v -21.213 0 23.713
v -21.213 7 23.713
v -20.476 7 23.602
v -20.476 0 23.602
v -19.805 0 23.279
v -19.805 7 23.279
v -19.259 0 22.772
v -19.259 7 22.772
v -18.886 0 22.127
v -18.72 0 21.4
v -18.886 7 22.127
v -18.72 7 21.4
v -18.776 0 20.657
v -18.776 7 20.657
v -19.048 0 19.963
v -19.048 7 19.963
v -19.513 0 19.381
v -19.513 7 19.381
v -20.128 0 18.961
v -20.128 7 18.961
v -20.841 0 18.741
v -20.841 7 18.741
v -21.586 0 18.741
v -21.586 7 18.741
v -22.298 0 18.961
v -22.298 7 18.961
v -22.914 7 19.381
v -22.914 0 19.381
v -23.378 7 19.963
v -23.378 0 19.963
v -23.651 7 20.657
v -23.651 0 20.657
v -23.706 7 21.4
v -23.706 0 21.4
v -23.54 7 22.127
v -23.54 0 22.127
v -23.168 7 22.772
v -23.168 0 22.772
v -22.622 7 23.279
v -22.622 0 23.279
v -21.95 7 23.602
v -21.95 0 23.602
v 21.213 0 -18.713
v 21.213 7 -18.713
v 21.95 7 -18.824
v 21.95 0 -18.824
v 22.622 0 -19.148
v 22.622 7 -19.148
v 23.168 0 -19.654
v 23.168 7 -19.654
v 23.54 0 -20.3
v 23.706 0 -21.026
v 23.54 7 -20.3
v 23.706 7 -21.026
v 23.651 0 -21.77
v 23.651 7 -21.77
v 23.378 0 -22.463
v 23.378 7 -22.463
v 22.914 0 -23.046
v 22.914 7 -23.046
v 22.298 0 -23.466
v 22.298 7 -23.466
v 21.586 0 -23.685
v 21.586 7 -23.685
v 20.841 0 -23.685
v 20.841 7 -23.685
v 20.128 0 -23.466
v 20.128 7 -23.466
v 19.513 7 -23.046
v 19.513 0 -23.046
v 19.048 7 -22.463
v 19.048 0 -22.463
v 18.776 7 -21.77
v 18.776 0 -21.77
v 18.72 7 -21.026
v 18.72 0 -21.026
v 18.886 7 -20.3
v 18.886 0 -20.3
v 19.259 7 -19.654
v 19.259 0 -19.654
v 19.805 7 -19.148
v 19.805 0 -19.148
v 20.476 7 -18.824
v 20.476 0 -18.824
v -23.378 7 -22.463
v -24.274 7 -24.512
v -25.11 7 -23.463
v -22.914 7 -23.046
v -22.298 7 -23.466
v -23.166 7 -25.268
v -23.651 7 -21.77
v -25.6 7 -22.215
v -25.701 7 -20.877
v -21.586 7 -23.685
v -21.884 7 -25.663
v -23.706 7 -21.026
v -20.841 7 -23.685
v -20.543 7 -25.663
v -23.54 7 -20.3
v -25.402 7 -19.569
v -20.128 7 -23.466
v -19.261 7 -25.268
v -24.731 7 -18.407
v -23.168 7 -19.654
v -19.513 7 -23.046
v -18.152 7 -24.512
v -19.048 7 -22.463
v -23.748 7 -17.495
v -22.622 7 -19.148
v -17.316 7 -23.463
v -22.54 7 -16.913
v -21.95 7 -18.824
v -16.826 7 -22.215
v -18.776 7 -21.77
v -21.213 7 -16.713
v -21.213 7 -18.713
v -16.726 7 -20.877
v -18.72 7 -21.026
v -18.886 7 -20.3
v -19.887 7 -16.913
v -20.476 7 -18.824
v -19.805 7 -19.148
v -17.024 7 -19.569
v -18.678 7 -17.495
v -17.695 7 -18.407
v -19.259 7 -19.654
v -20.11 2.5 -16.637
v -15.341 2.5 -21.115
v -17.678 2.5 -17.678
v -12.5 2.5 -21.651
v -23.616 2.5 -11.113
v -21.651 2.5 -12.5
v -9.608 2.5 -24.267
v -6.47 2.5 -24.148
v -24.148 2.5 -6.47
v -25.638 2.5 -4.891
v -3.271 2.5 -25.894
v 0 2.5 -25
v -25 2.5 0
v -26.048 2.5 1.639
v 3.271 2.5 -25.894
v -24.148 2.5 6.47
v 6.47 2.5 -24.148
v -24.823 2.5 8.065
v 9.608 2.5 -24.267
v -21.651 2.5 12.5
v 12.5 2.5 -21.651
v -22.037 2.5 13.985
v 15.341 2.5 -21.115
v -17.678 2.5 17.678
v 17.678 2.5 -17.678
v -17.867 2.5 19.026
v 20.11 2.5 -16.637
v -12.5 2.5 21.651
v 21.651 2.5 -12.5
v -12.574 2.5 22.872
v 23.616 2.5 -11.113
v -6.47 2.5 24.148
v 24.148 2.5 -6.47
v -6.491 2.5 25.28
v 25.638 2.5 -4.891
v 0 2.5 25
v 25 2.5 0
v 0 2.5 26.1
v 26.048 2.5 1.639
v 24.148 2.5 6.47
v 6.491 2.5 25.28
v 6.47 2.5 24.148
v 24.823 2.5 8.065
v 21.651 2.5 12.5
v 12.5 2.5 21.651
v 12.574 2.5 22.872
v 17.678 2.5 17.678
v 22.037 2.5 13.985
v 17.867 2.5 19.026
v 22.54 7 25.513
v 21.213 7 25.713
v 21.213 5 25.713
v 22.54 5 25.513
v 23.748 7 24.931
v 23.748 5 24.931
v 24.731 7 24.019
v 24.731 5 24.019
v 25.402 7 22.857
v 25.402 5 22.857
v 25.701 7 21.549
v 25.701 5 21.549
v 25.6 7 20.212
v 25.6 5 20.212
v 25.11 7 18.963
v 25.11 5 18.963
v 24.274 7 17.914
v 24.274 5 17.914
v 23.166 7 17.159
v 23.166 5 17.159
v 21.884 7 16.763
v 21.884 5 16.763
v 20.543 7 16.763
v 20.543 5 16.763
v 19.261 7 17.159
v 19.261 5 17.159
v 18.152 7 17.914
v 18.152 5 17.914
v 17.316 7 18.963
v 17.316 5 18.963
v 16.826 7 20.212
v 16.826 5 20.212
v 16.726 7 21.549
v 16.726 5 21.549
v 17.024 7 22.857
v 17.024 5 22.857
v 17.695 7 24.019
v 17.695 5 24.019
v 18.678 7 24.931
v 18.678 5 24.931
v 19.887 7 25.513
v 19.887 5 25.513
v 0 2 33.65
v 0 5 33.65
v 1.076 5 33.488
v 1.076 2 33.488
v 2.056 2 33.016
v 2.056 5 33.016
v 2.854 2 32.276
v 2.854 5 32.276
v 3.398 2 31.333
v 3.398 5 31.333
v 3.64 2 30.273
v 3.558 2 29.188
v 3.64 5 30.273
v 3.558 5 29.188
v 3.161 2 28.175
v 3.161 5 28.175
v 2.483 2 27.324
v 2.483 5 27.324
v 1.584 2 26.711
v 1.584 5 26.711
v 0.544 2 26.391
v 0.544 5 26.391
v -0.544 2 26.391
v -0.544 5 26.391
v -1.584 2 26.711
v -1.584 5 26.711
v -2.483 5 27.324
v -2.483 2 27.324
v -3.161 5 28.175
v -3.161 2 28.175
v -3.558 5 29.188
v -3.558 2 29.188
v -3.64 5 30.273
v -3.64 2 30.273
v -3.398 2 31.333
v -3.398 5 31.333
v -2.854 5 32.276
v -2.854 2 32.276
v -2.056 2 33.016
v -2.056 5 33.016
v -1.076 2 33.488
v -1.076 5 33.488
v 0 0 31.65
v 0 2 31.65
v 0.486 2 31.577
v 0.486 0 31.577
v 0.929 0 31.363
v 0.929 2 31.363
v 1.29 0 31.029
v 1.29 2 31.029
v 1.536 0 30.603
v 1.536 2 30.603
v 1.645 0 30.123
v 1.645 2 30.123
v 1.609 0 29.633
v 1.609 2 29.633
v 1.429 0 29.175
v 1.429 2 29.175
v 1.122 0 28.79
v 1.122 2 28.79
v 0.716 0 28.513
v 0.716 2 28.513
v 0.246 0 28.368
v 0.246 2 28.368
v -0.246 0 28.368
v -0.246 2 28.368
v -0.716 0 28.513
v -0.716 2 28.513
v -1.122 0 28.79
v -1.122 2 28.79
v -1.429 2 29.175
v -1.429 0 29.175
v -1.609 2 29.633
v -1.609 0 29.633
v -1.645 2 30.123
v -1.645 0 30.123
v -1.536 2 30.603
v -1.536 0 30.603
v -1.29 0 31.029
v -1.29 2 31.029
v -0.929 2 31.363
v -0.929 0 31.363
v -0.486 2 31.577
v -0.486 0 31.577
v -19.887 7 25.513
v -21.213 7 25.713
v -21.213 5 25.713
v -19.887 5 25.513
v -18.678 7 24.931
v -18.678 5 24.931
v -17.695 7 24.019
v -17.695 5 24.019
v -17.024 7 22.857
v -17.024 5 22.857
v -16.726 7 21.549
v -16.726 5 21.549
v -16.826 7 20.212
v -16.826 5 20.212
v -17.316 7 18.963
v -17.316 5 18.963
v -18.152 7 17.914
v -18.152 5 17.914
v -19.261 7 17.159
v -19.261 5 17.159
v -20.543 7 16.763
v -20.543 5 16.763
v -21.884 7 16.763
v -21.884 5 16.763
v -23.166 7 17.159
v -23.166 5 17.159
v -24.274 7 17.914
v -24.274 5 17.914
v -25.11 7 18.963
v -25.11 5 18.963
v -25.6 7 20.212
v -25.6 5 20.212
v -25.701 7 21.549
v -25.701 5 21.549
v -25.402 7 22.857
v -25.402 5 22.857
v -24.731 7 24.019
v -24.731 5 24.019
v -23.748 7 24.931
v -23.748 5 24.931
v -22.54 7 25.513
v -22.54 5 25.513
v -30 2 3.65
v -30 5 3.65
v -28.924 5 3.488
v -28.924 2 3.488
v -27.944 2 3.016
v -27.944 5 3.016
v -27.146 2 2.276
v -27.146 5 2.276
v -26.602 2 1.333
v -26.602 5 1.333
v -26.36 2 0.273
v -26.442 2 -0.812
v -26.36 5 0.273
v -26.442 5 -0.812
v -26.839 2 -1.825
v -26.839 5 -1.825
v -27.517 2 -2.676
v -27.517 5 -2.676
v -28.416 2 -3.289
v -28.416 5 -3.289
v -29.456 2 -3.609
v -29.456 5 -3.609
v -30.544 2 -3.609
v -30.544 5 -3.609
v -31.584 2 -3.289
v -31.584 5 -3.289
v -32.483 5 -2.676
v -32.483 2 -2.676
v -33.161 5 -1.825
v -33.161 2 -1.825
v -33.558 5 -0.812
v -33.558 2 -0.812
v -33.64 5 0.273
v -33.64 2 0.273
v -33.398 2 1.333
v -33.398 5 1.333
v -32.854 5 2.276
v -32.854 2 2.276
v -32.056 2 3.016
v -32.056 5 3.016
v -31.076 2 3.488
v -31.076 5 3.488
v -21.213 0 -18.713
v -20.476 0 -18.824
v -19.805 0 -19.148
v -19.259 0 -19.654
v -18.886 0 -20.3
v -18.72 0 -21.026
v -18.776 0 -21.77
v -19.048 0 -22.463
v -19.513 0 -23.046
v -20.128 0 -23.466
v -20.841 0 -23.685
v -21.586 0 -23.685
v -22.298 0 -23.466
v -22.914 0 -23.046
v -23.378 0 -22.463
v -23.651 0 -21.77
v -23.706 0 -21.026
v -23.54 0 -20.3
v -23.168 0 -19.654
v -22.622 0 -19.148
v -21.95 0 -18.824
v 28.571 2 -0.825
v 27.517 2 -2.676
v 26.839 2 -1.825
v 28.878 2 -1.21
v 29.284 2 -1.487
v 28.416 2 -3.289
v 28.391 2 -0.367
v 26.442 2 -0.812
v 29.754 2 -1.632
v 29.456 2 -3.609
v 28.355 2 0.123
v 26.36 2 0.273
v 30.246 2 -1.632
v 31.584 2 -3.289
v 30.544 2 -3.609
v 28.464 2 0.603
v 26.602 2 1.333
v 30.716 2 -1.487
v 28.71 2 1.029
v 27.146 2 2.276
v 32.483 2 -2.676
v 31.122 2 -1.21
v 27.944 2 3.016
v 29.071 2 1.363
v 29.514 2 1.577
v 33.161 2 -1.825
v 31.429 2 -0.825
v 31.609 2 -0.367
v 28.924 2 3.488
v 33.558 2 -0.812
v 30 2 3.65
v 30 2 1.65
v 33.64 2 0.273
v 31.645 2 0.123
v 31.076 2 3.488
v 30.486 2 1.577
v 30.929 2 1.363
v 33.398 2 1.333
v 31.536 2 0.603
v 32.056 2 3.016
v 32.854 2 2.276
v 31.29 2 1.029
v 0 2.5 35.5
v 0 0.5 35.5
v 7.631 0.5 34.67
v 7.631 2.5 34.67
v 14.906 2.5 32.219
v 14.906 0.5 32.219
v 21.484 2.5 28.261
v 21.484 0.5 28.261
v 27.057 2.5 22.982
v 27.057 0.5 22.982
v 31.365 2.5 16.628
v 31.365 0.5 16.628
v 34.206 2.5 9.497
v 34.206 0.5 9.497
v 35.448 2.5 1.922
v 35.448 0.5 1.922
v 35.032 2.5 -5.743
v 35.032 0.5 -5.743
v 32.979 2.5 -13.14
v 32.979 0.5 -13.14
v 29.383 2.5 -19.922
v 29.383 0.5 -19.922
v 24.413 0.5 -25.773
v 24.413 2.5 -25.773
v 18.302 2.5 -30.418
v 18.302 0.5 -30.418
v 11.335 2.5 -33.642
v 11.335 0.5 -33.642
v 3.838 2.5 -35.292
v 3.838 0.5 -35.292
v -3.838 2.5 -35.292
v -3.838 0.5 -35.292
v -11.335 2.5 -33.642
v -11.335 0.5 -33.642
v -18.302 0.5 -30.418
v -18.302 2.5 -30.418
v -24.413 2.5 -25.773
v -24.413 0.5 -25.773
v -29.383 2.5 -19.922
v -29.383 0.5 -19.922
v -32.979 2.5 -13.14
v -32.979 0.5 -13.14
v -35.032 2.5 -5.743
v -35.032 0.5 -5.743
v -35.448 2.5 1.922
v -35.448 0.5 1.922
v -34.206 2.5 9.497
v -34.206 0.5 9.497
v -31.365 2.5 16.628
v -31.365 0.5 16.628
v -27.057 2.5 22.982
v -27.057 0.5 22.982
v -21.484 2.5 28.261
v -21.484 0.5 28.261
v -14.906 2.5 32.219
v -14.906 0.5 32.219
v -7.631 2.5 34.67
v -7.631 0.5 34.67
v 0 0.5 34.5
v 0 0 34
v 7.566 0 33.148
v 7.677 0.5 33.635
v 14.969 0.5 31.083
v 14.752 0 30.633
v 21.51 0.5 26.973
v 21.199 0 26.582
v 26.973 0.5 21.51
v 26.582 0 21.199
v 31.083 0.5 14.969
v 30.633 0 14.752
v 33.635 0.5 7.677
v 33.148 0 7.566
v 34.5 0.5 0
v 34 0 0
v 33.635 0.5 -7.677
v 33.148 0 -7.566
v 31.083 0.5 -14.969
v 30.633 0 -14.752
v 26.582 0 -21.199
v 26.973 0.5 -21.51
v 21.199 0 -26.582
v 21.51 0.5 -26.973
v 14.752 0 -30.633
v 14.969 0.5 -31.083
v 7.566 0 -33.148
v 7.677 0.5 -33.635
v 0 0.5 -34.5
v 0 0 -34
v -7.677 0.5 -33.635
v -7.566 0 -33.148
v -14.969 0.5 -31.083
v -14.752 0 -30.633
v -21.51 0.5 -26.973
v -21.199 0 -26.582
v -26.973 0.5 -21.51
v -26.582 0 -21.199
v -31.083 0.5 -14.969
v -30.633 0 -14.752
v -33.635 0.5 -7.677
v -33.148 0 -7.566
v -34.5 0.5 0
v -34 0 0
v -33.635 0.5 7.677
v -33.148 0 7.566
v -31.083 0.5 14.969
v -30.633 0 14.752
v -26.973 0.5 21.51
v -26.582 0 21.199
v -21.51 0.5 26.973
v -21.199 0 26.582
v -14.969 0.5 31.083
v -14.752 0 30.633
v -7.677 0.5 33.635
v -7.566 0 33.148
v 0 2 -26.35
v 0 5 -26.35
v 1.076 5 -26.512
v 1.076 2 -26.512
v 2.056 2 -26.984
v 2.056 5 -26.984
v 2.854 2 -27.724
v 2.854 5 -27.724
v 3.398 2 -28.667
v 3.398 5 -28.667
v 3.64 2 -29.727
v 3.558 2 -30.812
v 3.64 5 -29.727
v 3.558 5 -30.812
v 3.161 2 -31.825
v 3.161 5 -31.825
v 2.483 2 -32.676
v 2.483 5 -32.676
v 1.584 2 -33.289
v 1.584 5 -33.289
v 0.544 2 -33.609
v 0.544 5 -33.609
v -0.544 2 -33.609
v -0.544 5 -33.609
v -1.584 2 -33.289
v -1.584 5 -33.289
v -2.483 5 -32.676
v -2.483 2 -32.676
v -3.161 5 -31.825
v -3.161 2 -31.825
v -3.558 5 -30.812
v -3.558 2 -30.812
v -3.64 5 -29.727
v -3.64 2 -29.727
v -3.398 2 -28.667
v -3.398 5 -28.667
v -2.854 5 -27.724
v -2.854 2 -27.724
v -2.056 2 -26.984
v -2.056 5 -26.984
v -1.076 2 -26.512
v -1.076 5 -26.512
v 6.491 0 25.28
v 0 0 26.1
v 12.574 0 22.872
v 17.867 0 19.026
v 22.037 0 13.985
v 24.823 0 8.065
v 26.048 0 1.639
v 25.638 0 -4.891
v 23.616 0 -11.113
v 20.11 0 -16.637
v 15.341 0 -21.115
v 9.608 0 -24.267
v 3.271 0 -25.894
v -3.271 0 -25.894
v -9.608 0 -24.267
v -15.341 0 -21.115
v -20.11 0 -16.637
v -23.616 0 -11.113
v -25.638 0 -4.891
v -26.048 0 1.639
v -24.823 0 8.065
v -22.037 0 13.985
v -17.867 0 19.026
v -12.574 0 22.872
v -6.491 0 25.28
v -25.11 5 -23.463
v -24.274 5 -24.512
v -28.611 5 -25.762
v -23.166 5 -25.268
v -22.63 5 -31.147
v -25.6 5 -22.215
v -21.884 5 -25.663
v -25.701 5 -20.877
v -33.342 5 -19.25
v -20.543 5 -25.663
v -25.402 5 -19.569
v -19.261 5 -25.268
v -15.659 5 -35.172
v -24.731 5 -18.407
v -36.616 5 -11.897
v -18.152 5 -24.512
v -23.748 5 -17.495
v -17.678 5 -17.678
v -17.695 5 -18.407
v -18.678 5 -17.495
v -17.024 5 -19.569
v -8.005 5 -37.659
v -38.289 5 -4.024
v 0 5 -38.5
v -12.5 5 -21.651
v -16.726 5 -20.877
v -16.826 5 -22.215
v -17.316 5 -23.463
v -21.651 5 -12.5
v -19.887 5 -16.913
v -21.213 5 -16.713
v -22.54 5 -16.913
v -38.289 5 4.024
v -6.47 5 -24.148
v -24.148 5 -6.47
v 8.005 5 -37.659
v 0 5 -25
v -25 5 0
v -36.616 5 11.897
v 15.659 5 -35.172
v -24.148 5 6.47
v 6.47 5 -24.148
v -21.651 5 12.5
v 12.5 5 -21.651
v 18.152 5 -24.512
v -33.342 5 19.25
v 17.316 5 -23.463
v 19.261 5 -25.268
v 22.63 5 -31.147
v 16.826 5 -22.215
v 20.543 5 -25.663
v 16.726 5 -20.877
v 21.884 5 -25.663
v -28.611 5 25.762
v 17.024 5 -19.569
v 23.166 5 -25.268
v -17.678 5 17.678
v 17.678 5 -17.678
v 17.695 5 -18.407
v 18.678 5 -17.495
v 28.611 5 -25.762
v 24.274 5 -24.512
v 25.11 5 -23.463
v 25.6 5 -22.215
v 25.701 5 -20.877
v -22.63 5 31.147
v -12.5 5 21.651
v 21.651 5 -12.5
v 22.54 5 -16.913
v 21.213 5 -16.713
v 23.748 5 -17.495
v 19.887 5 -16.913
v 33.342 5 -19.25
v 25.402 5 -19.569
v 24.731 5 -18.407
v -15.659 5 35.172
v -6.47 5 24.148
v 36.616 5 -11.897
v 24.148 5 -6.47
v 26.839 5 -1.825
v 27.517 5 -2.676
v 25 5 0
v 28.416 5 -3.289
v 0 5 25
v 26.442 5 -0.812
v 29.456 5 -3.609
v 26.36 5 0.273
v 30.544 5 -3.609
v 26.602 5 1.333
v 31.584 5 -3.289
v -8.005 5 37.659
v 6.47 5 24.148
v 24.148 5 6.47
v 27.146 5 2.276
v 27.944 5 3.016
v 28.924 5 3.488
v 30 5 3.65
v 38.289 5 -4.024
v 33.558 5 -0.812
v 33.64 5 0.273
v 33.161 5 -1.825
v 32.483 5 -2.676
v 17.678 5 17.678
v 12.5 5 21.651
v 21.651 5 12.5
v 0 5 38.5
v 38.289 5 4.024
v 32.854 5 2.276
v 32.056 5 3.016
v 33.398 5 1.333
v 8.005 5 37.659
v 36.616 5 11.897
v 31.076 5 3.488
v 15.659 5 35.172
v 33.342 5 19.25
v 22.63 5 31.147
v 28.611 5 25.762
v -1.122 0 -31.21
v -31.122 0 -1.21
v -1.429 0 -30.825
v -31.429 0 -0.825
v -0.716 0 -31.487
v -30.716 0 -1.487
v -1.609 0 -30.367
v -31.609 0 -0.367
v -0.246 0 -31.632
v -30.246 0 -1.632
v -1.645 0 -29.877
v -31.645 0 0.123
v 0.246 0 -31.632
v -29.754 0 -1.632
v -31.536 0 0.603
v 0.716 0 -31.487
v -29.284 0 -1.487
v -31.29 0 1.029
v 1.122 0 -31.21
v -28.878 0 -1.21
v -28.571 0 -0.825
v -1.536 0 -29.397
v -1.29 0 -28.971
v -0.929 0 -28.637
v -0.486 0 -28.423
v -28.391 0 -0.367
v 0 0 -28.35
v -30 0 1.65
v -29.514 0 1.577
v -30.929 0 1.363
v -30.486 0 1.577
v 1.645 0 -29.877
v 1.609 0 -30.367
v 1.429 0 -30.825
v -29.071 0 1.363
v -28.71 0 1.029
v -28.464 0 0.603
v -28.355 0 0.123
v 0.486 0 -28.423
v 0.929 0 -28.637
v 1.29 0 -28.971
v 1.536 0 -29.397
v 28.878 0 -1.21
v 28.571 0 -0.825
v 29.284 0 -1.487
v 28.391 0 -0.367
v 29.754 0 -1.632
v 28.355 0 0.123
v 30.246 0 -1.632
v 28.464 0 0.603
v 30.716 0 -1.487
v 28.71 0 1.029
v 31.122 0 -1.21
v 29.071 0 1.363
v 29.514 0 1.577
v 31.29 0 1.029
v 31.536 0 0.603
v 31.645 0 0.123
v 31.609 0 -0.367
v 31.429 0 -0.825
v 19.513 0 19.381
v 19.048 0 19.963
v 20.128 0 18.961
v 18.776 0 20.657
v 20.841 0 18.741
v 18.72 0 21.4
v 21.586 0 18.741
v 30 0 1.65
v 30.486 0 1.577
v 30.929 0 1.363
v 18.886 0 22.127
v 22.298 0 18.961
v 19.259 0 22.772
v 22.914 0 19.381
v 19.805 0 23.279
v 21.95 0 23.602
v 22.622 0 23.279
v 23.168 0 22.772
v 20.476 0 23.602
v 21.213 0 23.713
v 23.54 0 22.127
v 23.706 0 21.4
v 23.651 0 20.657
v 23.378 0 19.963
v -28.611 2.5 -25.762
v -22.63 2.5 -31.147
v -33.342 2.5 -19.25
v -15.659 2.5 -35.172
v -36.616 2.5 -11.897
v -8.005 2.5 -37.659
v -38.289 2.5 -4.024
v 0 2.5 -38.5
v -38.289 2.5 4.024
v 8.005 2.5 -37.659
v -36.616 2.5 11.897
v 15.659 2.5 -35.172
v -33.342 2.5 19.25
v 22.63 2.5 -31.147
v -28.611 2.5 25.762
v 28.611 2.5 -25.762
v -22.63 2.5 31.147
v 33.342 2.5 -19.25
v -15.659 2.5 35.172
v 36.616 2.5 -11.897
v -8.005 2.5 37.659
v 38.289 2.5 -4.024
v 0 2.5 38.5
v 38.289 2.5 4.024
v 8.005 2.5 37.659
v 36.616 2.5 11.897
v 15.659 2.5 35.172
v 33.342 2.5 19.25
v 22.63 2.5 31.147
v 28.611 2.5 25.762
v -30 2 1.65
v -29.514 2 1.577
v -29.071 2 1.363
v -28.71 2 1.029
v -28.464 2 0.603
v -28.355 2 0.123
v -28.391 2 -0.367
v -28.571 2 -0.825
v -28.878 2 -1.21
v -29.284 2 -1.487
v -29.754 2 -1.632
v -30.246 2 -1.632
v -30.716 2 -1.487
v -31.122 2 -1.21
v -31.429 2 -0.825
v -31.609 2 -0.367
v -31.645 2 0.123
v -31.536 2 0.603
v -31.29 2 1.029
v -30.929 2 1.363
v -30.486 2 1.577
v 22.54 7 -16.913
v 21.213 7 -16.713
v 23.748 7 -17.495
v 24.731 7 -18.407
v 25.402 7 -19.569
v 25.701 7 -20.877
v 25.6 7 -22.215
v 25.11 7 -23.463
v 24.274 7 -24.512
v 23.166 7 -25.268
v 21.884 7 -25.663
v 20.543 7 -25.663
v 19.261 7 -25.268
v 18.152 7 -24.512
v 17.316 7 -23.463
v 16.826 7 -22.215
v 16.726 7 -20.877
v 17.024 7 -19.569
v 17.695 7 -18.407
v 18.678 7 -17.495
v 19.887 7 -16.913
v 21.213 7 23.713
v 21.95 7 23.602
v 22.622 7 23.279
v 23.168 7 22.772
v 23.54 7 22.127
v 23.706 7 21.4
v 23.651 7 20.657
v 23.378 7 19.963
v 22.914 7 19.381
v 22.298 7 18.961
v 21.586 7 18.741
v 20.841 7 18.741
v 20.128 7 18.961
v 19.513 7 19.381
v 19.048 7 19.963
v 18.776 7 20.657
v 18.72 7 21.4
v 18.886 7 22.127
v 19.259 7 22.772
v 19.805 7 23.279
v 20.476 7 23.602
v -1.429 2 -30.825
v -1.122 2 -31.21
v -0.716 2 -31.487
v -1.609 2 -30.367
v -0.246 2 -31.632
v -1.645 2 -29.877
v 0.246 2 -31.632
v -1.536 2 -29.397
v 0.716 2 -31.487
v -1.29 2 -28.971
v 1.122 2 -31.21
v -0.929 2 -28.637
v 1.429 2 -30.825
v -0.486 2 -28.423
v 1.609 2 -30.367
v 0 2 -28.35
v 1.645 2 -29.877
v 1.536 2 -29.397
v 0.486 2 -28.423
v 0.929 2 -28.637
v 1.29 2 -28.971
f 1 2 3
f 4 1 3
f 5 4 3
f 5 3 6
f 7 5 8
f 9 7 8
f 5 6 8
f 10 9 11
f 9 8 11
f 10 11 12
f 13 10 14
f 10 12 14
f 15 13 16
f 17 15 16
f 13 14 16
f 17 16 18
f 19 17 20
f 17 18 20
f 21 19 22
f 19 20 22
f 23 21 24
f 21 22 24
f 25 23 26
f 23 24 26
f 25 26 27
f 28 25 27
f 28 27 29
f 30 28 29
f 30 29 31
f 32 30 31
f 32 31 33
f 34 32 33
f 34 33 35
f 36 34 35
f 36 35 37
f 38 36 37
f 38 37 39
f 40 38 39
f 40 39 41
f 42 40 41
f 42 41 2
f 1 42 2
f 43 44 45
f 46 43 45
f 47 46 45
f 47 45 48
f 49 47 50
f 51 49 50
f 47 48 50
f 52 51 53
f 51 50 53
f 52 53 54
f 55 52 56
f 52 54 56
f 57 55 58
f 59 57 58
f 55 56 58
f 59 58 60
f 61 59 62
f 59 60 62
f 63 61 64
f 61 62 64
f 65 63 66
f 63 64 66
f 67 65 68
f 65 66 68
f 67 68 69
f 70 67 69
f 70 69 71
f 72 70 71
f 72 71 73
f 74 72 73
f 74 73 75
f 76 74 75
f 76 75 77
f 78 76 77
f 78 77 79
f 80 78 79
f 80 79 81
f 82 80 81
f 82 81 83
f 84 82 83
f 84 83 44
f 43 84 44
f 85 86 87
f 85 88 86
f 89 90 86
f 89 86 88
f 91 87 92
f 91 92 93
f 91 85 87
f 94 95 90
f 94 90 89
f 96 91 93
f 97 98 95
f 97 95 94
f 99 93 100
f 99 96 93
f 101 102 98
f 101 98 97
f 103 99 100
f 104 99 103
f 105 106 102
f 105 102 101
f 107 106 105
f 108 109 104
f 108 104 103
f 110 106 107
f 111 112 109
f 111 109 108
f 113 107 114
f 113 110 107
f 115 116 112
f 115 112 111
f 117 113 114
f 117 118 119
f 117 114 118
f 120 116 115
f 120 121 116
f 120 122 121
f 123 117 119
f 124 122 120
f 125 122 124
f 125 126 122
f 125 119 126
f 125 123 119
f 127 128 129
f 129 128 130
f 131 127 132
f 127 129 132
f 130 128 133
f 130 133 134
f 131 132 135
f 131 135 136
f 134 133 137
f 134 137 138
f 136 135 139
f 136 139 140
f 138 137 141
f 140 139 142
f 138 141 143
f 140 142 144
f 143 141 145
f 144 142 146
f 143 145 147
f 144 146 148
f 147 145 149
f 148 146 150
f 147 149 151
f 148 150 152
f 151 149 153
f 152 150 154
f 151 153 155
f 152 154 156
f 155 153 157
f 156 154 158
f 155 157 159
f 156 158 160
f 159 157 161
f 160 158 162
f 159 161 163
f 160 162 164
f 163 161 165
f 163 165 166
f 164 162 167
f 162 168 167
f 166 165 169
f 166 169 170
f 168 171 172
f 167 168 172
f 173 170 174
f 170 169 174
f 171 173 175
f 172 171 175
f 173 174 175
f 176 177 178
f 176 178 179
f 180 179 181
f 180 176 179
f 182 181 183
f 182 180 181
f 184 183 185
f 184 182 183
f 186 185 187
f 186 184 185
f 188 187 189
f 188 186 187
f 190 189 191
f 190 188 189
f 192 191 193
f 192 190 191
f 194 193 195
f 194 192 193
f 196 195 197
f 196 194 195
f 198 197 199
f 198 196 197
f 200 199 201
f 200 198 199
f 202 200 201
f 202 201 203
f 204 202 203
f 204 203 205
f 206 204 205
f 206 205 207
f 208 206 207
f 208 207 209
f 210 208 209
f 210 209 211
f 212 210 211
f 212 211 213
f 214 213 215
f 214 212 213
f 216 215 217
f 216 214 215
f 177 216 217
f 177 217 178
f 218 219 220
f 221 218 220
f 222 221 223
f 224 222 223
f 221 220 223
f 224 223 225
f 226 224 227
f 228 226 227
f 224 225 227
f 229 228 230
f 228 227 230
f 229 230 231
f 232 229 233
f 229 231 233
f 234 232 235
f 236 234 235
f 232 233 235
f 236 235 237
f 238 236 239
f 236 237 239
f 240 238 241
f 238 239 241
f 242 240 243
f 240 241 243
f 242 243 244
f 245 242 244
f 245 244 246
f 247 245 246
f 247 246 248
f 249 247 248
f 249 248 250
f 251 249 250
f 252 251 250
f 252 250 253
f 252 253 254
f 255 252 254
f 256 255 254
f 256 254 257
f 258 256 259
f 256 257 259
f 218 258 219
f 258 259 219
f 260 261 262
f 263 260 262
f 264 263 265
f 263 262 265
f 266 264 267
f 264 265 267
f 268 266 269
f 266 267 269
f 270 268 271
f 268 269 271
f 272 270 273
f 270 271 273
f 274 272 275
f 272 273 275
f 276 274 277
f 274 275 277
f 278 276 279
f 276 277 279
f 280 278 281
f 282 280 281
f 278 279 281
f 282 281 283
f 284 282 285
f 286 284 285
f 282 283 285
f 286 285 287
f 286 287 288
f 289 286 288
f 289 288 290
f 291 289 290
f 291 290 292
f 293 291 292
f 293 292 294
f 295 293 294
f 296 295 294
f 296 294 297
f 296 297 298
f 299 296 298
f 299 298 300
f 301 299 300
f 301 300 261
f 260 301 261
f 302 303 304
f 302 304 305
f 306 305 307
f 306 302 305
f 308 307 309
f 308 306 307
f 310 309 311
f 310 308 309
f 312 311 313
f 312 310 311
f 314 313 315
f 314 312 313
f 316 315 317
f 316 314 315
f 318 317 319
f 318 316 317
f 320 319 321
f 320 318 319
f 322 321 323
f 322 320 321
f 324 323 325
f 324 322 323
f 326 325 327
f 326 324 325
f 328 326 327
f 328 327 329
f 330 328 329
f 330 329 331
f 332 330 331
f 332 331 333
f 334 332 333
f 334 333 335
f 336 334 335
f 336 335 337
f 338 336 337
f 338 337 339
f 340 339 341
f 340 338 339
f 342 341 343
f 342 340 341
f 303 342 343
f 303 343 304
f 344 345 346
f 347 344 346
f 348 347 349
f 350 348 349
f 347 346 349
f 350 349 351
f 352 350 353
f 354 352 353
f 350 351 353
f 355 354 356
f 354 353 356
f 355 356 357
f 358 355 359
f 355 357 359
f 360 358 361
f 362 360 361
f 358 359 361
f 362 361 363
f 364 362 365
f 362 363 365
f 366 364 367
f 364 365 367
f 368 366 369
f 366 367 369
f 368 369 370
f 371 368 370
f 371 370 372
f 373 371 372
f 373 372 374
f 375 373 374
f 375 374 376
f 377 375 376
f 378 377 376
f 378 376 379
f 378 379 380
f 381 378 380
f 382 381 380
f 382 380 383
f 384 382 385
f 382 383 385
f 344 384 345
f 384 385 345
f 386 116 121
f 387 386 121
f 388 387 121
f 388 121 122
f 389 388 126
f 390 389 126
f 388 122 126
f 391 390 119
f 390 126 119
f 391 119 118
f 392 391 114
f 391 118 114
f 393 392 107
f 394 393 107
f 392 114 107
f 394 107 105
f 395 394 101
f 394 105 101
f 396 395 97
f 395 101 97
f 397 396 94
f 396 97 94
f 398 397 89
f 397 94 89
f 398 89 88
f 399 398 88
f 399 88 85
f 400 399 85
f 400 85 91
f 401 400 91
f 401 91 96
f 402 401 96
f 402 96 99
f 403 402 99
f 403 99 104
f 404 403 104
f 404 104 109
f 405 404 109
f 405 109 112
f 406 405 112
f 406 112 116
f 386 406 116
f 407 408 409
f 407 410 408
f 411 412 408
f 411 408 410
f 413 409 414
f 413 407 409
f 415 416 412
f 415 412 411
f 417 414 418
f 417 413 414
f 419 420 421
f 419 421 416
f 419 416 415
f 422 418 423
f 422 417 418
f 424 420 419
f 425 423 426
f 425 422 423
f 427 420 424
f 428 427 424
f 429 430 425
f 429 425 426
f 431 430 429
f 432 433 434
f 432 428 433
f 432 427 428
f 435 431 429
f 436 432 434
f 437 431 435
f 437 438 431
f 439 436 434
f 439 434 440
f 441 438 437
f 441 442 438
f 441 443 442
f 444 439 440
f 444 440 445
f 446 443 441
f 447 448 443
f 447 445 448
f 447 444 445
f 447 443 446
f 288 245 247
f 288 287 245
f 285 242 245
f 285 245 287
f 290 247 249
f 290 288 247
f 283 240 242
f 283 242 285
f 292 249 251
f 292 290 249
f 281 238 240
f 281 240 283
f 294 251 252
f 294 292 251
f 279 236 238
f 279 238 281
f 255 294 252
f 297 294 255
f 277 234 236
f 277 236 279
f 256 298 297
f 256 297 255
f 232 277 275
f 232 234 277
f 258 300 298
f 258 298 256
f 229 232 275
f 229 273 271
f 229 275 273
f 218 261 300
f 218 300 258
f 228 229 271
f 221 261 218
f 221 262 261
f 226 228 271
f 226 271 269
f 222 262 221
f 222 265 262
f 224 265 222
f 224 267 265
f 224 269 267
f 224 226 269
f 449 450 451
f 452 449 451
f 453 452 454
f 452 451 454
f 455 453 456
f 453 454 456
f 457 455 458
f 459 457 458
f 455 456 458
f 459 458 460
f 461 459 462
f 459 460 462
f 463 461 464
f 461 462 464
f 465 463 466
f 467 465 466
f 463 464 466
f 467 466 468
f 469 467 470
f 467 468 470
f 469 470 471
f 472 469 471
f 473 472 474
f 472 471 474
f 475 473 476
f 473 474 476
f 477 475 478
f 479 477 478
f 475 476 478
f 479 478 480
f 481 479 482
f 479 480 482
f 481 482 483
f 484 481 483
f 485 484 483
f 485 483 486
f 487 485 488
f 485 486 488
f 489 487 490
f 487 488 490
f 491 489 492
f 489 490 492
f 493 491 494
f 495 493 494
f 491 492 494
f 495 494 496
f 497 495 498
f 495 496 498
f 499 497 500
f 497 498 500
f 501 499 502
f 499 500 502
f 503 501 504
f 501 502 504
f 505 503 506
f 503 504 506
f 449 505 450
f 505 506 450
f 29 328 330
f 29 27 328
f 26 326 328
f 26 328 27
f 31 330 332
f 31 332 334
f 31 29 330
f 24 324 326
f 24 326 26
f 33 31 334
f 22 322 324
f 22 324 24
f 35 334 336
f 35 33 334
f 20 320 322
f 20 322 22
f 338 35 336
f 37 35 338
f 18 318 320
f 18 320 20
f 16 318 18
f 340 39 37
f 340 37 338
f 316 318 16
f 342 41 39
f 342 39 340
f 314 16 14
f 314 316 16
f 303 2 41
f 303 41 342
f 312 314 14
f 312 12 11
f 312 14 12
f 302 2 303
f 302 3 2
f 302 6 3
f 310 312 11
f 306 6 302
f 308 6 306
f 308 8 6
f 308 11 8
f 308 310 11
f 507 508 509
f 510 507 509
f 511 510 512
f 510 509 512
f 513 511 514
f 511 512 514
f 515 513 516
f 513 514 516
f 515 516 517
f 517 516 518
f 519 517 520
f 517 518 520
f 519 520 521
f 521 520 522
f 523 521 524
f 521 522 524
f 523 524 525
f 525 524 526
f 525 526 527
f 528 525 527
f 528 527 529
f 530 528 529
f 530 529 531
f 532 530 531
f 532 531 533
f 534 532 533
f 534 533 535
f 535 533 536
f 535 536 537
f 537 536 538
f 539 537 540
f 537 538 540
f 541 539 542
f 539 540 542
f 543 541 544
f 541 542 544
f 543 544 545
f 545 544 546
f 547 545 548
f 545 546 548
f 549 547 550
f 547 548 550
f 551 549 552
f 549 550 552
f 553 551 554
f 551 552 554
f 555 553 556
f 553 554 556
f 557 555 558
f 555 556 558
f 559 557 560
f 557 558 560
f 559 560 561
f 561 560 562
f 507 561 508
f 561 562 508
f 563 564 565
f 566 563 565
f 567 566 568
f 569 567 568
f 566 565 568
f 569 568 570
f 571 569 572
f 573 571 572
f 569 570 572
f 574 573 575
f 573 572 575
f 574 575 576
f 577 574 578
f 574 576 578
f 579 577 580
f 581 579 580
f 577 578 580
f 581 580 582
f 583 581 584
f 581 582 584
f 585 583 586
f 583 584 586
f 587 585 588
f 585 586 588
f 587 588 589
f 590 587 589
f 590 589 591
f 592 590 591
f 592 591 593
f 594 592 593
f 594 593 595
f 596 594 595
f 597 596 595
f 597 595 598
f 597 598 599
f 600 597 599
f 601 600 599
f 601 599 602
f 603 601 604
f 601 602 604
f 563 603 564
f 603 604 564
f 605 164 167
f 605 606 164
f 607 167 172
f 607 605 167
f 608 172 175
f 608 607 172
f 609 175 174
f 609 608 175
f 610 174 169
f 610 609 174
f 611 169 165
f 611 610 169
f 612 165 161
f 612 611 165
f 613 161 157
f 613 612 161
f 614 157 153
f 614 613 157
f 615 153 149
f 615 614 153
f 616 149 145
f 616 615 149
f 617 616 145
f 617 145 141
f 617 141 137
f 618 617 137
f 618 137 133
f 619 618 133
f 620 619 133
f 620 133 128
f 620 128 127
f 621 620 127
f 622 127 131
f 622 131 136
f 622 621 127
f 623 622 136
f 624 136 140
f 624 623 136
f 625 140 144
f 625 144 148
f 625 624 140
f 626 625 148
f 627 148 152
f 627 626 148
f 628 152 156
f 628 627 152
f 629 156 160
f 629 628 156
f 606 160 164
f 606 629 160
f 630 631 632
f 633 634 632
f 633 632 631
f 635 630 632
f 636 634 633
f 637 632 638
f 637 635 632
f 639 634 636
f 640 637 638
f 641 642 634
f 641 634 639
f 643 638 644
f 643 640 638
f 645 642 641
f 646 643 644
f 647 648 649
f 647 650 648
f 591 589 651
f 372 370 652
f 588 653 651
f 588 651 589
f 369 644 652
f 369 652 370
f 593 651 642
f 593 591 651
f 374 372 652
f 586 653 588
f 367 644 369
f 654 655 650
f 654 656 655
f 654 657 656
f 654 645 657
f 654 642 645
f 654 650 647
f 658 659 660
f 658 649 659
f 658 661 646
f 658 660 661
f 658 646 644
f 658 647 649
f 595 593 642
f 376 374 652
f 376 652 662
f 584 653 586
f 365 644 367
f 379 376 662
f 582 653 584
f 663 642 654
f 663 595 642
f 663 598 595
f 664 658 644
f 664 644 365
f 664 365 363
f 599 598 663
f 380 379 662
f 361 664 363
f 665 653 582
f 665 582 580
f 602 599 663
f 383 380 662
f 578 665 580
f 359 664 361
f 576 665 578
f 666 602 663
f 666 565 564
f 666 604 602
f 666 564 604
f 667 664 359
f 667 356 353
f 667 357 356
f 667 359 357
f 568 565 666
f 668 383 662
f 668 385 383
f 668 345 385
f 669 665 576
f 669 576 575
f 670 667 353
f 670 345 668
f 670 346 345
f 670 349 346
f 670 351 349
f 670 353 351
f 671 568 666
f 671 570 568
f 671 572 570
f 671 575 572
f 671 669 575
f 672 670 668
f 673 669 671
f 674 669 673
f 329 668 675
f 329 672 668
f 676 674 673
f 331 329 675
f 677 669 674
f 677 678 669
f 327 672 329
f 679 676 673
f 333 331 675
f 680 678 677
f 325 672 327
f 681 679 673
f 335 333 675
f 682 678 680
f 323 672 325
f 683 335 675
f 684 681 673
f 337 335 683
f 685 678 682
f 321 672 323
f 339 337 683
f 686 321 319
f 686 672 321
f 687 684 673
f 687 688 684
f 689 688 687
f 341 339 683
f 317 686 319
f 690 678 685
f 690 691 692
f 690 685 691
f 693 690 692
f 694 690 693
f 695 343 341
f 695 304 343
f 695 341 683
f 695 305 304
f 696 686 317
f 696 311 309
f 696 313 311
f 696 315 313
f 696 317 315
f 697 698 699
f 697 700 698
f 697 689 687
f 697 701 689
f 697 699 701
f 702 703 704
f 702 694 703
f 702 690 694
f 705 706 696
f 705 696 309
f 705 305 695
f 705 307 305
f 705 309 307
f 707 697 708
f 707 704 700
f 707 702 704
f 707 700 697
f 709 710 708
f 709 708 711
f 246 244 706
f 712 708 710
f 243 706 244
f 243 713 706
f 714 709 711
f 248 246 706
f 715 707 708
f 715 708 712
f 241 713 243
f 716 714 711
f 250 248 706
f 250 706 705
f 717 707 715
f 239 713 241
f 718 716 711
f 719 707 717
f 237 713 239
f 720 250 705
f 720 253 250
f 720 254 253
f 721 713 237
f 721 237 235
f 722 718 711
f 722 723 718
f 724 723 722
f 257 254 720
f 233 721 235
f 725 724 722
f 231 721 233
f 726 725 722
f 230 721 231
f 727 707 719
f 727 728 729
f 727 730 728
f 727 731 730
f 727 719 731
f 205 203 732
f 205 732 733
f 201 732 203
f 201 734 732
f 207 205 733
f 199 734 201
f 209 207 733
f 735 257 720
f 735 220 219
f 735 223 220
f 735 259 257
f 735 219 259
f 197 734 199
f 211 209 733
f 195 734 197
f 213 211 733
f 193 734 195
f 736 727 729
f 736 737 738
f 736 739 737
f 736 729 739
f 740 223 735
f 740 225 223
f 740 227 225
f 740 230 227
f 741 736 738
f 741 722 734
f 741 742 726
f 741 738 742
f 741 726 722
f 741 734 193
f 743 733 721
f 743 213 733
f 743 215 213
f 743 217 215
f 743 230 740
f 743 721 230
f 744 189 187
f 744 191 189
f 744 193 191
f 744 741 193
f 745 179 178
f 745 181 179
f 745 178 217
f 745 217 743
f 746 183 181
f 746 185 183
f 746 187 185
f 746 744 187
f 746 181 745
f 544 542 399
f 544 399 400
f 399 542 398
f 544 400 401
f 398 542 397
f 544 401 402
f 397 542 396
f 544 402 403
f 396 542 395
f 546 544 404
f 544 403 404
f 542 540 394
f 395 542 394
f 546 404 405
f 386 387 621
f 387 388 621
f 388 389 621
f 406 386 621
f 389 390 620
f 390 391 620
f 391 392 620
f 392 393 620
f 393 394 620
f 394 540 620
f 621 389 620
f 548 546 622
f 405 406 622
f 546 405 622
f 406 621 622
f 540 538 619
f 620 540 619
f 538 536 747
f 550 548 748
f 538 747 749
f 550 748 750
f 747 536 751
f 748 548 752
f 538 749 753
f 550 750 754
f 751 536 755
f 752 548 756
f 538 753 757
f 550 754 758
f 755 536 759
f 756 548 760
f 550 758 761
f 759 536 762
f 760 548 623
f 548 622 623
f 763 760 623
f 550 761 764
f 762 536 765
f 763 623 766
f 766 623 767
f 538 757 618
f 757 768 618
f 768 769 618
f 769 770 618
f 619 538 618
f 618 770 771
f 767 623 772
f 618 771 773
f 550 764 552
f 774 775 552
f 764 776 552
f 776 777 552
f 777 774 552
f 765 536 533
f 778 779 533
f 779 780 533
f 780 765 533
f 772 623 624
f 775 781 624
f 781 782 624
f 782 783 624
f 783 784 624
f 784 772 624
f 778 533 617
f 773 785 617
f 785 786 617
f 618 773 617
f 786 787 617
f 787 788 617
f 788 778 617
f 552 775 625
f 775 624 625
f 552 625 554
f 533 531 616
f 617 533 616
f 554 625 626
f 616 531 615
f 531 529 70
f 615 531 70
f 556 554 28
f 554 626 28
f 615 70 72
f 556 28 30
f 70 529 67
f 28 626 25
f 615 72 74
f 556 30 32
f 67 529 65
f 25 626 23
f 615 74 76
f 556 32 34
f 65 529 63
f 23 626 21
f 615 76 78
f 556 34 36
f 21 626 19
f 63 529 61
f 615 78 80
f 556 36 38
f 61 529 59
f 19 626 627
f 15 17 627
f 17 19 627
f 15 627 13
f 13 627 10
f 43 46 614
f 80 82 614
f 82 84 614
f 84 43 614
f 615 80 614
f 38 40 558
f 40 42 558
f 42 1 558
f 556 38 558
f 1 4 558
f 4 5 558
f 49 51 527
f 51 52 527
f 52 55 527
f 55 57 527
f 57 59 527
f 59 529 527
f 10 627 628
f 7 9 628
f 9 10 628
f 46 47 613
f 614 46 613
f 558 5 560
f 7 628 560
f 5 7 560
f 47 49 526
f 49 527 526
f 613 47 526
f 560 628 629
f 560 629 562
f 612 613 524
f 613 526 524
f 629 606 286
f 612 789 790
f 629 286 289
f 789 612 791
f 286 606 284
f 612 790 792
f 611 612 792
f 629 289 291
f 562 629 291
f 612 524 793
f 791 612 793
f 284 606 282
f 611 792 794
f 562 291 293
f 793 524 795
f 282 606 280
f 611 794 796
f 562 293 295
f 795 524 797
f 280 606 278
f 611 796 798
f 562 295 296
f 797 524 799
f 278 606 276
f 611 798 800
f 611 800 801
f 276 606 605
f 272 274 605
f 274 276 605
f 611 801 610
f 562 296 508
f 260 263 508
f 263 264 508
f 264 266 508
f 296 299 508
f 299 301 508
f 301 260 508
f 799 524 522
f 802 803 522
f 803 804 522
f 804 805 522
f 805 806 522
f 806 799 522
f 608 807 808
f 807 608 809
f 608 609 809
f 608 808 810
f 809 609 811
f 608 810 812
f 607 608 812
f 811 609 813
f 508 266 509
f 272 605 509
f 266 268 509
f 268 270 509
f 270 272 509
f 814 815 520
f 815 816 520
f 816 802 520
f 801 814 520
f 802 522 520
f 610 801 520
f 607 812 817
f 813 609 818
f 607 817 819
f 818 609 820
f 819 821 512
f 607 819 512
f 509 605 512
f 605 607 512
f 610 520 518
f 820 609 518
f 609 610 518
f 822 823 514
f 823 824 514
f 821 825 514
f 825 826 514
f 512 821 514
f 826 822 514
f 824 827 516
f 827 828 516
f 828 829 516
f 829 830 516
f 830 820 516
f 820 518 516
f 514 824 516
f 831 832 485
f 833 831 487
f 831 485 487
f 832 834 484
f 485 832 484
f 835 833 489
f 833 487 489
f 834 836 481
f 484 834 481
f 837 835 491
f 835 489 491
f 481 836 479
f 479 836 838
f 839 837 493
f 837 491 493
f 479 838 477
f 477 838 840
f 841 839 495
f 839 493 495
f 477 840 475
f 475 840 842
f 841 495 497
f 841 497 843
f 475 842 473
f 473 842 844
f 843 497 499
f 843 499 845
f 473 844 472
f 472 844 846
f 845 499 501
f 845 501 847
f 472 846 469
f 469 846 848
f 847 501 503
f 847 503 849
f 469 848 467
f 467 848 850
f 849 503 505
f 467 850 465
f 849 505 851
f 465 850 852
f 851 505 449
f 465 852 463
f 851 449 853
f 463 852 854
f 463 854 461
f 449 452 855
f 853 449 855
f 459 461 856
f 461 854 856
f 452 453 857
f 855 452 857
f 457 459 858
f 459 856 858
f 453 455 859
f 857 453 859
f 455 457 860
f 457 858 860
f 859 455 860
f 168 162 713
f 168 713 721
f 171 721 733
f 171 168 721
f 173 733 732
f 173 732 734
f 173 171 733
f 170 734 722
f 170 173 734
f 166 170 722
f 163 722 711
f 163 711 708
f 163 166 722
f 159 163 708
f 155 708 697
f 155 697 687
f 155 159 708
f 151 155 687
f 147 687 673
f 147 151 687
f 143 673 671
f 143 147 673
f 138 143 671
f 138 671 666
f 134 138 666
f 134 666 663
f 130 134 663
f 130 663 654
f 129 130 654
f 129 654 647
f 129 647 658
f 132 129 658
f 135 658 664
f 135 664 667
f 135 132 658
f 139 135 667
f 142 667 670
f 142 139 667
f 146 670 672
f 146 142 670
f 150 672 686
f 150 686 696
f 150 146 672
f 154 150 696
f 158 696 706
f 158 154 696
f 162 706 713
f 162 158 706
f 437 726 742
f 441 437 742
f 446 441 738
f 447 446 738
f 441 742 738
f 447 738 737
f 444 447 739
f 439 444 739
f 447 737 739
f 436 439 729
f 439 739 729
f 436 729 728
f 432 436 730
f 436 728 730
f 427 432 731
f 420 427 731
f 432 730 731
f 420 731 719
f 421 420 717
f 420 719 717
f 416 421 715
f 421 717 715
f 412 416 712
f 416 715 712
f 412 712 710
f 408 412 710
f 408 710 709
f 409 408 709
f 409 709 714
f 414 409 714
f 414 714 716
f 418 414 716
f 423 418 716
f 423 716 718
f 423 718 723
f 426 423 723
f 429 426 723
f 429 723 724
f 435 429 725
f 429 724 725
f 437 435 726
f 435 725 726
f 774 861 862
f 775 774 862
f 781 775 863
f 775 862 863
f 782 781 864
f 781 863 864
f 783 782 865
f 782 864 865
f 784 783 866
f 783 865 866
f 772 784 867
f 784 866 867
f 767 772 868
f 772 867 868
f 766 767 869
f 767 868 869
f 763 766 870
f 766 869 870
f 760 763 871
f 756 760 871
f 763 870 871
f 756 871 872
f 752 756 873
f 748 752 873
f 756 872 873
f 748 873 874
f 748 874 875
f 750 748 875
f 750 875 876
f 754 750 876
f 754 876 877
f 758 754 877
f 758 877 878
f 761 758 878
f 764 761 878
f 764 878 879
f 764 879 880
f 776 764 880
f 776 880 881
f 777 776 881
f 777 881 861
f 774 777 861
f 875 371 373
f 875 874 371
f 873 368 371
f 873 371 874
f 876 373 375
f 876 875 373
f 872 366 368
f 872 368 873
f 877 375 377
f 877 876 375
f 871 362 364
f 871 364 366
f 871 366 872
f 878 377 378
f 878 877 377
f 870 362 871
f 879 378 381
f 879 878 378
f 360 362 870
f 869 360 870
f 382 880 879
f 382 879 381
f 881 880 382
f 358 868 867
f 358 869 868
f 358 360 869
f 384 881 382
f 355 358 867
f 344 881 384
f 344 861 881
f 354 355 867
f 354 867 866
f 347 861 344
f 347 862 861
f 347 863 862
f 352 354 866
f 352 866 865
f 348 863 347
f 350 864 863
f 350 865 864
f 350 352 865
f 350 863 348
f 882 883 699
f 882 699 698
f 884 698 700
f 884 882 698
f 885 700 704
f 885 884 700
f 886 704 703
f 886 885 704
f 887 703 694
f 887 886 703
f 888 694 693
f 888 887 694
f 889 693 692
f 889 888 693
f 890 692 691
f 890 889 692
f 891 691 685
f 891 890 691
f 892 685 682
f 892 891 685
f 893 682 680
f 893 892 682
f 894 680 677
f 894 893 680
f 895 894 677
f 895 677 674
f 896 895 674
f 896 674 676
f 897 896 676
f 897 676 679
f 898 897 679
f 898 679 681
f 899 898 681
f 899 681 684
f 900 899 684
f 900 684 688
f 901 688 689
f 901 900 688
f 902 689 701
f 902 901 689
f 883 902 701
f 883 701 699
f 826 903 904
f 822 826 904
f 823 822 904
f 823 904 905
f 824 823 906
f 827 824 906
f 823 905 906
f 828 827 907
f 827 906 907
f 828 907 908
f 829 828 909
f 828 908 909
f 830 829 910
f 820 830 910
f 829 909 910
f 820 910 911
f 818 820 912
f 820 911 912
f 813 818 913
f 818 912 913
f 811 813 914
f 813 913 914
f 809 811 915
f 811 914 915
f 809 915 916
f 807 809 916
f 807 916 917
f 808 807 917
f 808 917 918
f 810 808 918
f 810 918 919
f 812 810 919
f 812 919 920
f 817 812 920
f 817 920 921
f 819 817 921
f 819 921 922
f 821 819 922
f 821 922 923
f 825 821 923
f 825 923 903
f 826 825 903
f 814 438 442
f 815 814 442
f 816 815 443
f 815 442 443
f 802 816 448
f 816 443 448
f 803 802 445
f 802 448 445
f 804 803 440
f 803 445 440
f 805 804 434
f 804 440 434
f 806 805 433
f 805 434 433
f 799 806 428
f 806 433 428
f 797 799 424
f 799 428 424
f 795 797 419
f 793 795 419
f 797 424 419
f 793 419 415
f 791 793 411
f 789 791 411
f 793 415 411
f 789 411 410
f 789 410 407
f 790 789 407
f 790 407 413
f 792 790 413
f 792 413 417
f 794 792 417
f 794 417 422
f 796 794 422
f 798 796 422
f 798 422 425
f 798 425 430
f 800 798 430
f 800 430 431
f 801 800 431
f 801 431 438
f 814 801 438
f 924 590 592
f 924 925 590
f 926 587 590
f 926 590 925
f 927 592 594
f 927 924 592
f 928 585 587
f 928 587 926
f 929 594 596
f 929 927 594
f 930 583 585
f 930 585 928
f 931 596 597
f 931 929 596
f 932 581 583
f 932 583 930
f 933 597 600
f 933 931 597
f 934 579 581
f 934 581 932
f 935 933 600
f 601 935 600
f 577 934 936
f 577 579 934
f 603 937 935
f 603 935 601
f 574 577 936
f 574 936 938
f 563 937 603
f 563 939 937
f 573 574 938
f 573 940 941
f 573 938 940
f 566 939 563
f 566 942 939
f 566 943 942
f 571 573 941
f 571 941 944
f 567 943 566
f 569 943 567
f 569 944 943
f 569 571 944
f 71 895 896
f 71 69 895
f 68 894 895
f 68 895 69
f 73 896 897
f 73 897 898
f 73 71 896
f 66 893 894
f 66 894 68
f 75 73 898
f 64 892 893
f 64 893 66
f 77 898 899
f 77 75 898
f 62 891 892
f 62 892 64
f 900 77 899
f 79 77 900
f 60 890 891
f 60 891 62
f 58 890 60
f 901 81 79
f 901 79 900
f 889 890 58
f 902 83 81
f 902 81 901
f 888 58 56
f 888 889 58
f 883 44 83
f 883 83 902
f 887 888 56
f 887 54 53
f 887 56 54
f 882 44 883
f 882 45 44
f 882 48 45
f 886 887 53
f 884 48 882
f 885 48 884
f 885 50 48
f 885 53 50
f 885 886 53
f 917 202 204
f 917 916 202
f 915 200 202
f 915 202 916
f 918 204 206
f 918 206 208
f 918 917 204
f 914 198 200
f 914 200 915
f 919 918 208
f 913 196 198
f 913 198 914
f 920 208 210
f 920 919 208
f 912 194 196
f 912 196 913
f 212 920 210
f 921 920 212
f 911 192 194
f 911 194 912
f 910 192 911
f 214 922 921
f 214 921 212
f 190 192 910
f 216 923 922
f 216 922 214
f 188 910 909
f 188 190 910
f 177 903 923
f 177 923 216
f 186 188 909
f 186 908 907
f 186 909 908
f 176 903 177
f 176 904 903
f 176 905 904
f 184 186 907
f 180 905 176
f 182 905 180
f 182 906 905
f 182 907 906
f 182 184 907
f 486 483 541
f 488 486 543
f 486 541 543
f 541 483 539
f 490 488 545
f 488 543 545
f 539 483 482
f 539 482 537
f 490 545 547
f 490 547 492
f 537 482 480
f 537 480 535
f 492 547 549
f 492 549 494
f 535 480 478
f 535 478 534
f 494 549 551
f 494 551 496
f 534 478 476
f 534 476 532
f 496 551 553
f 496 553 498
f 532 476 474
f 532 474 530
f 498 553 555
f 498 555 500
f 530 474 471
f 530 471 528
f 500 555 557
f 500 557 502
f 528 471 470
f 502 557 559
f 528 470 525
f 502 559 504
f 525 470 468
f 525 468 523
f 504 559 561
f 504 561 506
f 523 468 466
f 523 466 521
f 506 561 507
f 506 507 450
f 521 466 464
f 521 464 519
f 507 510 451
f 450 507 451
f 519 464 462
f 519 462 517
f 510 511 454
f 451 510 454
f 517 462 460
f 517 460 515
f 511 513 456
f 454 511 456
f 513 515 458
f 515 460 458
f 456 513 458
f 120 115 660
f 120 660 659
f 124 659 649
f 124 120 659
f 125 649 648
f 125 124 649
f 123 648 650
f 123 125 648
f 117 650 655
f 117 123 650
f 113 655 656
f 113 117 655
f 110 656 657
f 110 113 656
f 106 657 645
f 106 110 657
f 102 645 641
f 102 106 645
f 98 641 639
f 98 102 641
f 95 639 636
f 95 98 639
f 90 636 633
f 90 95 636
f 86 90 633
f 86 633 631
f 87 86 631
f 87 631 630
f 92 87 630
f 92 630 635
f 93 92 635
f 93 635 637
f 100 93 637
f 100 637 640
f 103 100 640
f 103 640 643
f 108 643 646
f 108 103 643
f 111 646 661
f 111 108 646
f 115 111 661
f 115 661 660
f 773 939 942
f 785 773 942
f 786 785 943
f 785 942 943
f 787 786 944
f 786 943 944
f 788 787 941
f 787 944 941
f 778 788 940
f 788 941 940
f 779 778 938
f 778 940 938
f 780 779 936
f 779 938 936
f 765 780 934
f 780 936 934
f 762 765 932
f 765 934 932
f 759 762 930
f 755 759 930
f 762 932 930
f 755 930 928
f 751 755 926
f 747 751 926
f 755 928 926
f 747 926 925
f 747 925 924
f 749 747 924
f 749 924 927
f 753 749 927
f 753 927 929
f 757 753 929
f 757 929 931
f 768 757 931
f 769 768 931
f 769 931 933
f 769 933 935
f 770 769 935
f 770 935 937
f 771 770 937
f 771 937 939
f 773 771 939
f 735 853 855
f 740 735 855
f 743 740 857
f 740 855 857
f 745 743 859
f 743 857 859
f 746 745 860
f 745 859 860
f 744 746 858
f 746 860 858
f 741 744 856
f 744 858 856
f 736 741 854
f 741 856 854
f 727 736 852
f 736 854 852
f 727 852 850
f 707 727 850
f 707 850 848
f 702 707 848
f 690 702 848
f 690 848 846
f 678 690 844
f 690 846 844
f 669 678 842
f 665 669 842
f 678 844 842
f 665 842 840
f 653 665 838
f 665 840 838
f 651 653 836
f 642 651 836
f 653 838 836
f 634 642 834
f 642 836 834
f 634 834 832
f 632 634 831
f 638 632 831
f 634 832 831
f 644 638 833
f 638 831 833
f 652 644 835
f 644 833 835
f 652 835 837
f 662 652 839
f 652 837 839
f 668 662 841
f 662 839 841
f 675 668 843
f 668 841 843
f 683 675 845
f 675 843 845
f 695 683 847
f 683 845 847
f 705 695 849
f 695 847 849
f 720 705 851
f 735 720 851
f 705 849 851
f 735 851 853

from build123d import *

# Parameters (mm, degrees)
SKETCH1_R           = 34
SKETCH1_R_2         = 26.1
BOSS_EXTRUDE1_DEPTH = 0.5
SKETCH2_R           = 35.5
SKETCH2_R_2         = 26.1
BOSS_EXTRUDE2_DEPTH = 2
SKETCH3_R           = 38.5
SKETCH3_R_2         = 25
BOSS_EXTRUDE3_DEPTH = 2.5
CHAMFER1_SIZE       = 0.5
SKETCH4_R           = 1.65
SKETCH4_R_2         = 2.5
CUT_EXTRUDE1_DEPTH  = 55.676320286
SKETCH6_R           = 3.65
SKETCH6_R_2         = 1.65
CUT_EXTRUDE2_DEPTH  = 3
BOSS_EXTRUDE4_START = 2
SKETCH7_R           = 4.5
SKETCH7_R_2         = 2.5
BOSS_EXTRUDE4_DEPTH = 2


with BuildPart() as part:
    # Sketch1 → Boss-Extrude1 (new body)
    with BuildSketch(Plane(origin=(0, 0, 0), x_dir=(1, 0, 0), z_dir=(0, 1, 0))):
        with Locations(Location((0, 0, 0), (0, 0, 270))):
            Circle(SKETCH1_R)
        with Locations(Location((0, 0, 0), (0, 0, 270))):
            Circle(SKETCH1_R_2, mode=Mode.SUBTRACT)
    extrude(amount=BOSS_EXTRUDE1_DEPTH)

    # Sketch2 → Boss-Extrude2 (add)
    with BuildSketch(Plane(origin=(0, 0.5, 0), x_dir=(1, 0, 0), z_dir=(0, 1, 0))):
        with Locations(Location((0, 0, 0), (0, 0, 270))):
            Circle(SKETCH2_R)
        with Locations(Location((0, 0, 0), (0, 0, 270))):
            Circle(SKETCH2_R_2, mode=Mode.SUBTRACT)
    extrude(amount=BOSS_EXTRUDE2_DEPTH)

    # Sketch3 → Boss-Extrude3 (add)
    with BuildSketch(Plane(origin=(0, 2.5, 0), x_dir=(1, 0, 0), z_dir=(0, 1, 0))):
        with Locations(Location((0, 0, 0), (0, 0, 270))):
            Circle(SKETCH3_R)
        with Locations(Location((0, 0, 0), (0, 0, 270))):
            Circle(SKETCH3_R_2, mode=Mode.SUBTRACT)
    extrude(amount=BOSS_EXTRUDE3_DEPTH)

    # Chamfer1
    chamfer1_edges = [part.edges().sort_by_distance(p)[0] for p in [
        (0, 0.5, -34),
    ]]
    chamfer(chamfer1_edges, length=CHAMFER1_SIZE - 0.0001)  # a hair under: the kernel refuses the full size

    # Sketch4 → Cut-Extrude1 (cut, through all)
    with BuildSketch(Plane(origin=(0, 5, 0), x_dir=(1, 0, 0), z_dir=(0, 1, 0))):
        with Locations(Location((0, 30, 0), (0, 0, 270))):
            Circle(SKETCH4_R)
        with Locations(Location((21.213203436, 21.213203436, 0), (0, 0, 270))):
            Circle(SKETCH4_R_2)
        with Locations(Location((30, 0, 0), (0, 0, 270))):
            Circle(SKETCH4_R)
        with Locations(Location((21.213203436, -21.213203436, 0), (0, 0, 270))):
            Circle(SKETCH4_R_2)
        with Locations(Location((0, -30, 0), (0, 0, 270))):
            Circle(SKETCH4_R)
        with Locations(Location((-21.213203436, -21.213203436, 0), (0, 0, 270))):
            Circle(SKETCH4_R_2)
        with Locations(Location((-30, 0, 0), (0, 0, 270))):
            Circle(SKETCH4_R)
        with Locations(Location((-21.213203436, 21.213203436, 0), (0, 0, 270))):
            Circle(SKETCH4_R_2)
    extrude(amount=-CUT_EXTRUDE1_DEPTH, mode=Mode.SUBTRACT)

    # Sketch6 → Cut-Extrude2 (cut)
    # profile 1 of 4: a face of its own
    with BuildSketch(Plane(origin=(0, 5, 0), x_dir=(1, 0, 0), z_dir=(0, 1, 0))):
        with Locations(Location((0, -30, 0), (0, 0, 270))):
            Circle(SKETCH6_R)
        with Locations(Location((0, -30, 0), (0, 0, 270))):
            Circle(SKETCH6_R_2, mode=Mode.SUBTRACT)
    # profile 2 of 4: a face of its own
    with BuildSketch(Plane(origin=(0, 5, 0), x_dir=(1, 0, 0), z_dir=(0, 1, 0))):
        with Locations(Location((30, 0, 0), (0, 0, 270))):
            Circle(SKETCH6_R)
        with Locations(Location((30, 0, 0), (0, 0, 270))):
            Circle(SKETCH6_R_2, mode=Mode.SUBTRACT)
    # profile 3 of 4: a face of its own
    with BuildSketch(Plane(origin=(0, 5, 0), x_dir=(1, 0, 0), z_dir=(0, 1, 0))):
        with Locations(Location((0, 30, 0), (0, 0, 270))):
            Circle(SKETCH6_R)
        with Locations(Location((0, 30, 0), (0, 0, 270))):
            Circle(SKETCH6_R_2, mode=Mode.SUBTRACT)
    # profile 4 of 4: a face of its own
    with BuildSketch(Plane(origin=(0, 5, 0), x_dir=(1, 0, 0), z_dir=(0, 1, 0))):
        with Locations(Location((-30, 0, 0), (0, 0, 270))):
            Circle(SKETCH6_R)
        with Locations(Location((-30, 0, 0), (0, 0, 270))):
            Circle(SKETCH6_R_2, mode=Mode.SUBTRACT)
    extrude(amount=-CUT_EXTRUDE2_DEPTH, mode=Mode.SUBTRACT)

    # Sketch7 → Boss-Extrude4 (add)
    # profile 1 of 4: a face of its own
    with BuildSketch(Plane(origin=(0, 5, 0), x_dir=(1, 0, 0), z_dir=(0, 1, 0)).offset(BOSS_EXTRUDE4_START)):
        with Locations(Location((-21.213203436, 21.213203436, 0), (0, 0, 270))):
            Circle(SKETCH7_R)
        with Locations(Location((-21.213203436, 21.213203436, 0), (0, 0, 270))):
            Circle(SKETCH7_R_2, mode=Mode.SUBTRACT)
    # profile 2 of 4: a face of its own
    with BuildSketch(Plane(origin=(0, 5, 0), x_dir=(1, 0, 0), z_dir=(0, 1, 0)).offset(BOSS_EXTRUDE4_START)):
        with Locations(Location((21.213203436, 21.213203436, 0), (0, 0, 270))):
            Circle(SKETCH7_R)
        with Locations(Location((21.213203436, 21.213203436, 0), (0, 0, 270))):
            Circle(SKETCH7_R_2, mode=Mode.SUBTRACT)
    # profile 3 of 4: a face of its own
    with BuildSketch(Plane(origin=(0, 5, 0), x_dir=(1, 0, 0), z_dir=(0, 1, 0)).offset(BOSS_EXTRUDE4_START)):
        with Locations(Location((21.213203436, -21.213203436, 0), (0, 0, 270))):
            Circle(SKETCH7_R)
        with Locations(Location((21.213203436, -21.213203436, 0), (0, 0, 270))):
            Circle(SKETCH7_R_2, mode=Mode.SUBTRACT)
    # profile 4 of 4: a face of its own
    with BuildSketch(Plane(origin=(0, 5, 0), x_dir=(1, 0, 0), z_dir=(0, 1, 0)).offset(BOSS_EXTRUDE4_START)):
        with Locations(Location((-21.213203436, -21.213203436, 0), (0, 0, 270))):
            Circle(SKETCH7_R)
        with Locations(Location((-21.213203436, -21.213203436, 0), (0, 0, 270))):
            Circle(SKETCH7_R_2, mode=Mode.SUBTRACT)
    extrude(amount=-BOSS_EXTRUDE4_DEPTH)


solid = part.part
